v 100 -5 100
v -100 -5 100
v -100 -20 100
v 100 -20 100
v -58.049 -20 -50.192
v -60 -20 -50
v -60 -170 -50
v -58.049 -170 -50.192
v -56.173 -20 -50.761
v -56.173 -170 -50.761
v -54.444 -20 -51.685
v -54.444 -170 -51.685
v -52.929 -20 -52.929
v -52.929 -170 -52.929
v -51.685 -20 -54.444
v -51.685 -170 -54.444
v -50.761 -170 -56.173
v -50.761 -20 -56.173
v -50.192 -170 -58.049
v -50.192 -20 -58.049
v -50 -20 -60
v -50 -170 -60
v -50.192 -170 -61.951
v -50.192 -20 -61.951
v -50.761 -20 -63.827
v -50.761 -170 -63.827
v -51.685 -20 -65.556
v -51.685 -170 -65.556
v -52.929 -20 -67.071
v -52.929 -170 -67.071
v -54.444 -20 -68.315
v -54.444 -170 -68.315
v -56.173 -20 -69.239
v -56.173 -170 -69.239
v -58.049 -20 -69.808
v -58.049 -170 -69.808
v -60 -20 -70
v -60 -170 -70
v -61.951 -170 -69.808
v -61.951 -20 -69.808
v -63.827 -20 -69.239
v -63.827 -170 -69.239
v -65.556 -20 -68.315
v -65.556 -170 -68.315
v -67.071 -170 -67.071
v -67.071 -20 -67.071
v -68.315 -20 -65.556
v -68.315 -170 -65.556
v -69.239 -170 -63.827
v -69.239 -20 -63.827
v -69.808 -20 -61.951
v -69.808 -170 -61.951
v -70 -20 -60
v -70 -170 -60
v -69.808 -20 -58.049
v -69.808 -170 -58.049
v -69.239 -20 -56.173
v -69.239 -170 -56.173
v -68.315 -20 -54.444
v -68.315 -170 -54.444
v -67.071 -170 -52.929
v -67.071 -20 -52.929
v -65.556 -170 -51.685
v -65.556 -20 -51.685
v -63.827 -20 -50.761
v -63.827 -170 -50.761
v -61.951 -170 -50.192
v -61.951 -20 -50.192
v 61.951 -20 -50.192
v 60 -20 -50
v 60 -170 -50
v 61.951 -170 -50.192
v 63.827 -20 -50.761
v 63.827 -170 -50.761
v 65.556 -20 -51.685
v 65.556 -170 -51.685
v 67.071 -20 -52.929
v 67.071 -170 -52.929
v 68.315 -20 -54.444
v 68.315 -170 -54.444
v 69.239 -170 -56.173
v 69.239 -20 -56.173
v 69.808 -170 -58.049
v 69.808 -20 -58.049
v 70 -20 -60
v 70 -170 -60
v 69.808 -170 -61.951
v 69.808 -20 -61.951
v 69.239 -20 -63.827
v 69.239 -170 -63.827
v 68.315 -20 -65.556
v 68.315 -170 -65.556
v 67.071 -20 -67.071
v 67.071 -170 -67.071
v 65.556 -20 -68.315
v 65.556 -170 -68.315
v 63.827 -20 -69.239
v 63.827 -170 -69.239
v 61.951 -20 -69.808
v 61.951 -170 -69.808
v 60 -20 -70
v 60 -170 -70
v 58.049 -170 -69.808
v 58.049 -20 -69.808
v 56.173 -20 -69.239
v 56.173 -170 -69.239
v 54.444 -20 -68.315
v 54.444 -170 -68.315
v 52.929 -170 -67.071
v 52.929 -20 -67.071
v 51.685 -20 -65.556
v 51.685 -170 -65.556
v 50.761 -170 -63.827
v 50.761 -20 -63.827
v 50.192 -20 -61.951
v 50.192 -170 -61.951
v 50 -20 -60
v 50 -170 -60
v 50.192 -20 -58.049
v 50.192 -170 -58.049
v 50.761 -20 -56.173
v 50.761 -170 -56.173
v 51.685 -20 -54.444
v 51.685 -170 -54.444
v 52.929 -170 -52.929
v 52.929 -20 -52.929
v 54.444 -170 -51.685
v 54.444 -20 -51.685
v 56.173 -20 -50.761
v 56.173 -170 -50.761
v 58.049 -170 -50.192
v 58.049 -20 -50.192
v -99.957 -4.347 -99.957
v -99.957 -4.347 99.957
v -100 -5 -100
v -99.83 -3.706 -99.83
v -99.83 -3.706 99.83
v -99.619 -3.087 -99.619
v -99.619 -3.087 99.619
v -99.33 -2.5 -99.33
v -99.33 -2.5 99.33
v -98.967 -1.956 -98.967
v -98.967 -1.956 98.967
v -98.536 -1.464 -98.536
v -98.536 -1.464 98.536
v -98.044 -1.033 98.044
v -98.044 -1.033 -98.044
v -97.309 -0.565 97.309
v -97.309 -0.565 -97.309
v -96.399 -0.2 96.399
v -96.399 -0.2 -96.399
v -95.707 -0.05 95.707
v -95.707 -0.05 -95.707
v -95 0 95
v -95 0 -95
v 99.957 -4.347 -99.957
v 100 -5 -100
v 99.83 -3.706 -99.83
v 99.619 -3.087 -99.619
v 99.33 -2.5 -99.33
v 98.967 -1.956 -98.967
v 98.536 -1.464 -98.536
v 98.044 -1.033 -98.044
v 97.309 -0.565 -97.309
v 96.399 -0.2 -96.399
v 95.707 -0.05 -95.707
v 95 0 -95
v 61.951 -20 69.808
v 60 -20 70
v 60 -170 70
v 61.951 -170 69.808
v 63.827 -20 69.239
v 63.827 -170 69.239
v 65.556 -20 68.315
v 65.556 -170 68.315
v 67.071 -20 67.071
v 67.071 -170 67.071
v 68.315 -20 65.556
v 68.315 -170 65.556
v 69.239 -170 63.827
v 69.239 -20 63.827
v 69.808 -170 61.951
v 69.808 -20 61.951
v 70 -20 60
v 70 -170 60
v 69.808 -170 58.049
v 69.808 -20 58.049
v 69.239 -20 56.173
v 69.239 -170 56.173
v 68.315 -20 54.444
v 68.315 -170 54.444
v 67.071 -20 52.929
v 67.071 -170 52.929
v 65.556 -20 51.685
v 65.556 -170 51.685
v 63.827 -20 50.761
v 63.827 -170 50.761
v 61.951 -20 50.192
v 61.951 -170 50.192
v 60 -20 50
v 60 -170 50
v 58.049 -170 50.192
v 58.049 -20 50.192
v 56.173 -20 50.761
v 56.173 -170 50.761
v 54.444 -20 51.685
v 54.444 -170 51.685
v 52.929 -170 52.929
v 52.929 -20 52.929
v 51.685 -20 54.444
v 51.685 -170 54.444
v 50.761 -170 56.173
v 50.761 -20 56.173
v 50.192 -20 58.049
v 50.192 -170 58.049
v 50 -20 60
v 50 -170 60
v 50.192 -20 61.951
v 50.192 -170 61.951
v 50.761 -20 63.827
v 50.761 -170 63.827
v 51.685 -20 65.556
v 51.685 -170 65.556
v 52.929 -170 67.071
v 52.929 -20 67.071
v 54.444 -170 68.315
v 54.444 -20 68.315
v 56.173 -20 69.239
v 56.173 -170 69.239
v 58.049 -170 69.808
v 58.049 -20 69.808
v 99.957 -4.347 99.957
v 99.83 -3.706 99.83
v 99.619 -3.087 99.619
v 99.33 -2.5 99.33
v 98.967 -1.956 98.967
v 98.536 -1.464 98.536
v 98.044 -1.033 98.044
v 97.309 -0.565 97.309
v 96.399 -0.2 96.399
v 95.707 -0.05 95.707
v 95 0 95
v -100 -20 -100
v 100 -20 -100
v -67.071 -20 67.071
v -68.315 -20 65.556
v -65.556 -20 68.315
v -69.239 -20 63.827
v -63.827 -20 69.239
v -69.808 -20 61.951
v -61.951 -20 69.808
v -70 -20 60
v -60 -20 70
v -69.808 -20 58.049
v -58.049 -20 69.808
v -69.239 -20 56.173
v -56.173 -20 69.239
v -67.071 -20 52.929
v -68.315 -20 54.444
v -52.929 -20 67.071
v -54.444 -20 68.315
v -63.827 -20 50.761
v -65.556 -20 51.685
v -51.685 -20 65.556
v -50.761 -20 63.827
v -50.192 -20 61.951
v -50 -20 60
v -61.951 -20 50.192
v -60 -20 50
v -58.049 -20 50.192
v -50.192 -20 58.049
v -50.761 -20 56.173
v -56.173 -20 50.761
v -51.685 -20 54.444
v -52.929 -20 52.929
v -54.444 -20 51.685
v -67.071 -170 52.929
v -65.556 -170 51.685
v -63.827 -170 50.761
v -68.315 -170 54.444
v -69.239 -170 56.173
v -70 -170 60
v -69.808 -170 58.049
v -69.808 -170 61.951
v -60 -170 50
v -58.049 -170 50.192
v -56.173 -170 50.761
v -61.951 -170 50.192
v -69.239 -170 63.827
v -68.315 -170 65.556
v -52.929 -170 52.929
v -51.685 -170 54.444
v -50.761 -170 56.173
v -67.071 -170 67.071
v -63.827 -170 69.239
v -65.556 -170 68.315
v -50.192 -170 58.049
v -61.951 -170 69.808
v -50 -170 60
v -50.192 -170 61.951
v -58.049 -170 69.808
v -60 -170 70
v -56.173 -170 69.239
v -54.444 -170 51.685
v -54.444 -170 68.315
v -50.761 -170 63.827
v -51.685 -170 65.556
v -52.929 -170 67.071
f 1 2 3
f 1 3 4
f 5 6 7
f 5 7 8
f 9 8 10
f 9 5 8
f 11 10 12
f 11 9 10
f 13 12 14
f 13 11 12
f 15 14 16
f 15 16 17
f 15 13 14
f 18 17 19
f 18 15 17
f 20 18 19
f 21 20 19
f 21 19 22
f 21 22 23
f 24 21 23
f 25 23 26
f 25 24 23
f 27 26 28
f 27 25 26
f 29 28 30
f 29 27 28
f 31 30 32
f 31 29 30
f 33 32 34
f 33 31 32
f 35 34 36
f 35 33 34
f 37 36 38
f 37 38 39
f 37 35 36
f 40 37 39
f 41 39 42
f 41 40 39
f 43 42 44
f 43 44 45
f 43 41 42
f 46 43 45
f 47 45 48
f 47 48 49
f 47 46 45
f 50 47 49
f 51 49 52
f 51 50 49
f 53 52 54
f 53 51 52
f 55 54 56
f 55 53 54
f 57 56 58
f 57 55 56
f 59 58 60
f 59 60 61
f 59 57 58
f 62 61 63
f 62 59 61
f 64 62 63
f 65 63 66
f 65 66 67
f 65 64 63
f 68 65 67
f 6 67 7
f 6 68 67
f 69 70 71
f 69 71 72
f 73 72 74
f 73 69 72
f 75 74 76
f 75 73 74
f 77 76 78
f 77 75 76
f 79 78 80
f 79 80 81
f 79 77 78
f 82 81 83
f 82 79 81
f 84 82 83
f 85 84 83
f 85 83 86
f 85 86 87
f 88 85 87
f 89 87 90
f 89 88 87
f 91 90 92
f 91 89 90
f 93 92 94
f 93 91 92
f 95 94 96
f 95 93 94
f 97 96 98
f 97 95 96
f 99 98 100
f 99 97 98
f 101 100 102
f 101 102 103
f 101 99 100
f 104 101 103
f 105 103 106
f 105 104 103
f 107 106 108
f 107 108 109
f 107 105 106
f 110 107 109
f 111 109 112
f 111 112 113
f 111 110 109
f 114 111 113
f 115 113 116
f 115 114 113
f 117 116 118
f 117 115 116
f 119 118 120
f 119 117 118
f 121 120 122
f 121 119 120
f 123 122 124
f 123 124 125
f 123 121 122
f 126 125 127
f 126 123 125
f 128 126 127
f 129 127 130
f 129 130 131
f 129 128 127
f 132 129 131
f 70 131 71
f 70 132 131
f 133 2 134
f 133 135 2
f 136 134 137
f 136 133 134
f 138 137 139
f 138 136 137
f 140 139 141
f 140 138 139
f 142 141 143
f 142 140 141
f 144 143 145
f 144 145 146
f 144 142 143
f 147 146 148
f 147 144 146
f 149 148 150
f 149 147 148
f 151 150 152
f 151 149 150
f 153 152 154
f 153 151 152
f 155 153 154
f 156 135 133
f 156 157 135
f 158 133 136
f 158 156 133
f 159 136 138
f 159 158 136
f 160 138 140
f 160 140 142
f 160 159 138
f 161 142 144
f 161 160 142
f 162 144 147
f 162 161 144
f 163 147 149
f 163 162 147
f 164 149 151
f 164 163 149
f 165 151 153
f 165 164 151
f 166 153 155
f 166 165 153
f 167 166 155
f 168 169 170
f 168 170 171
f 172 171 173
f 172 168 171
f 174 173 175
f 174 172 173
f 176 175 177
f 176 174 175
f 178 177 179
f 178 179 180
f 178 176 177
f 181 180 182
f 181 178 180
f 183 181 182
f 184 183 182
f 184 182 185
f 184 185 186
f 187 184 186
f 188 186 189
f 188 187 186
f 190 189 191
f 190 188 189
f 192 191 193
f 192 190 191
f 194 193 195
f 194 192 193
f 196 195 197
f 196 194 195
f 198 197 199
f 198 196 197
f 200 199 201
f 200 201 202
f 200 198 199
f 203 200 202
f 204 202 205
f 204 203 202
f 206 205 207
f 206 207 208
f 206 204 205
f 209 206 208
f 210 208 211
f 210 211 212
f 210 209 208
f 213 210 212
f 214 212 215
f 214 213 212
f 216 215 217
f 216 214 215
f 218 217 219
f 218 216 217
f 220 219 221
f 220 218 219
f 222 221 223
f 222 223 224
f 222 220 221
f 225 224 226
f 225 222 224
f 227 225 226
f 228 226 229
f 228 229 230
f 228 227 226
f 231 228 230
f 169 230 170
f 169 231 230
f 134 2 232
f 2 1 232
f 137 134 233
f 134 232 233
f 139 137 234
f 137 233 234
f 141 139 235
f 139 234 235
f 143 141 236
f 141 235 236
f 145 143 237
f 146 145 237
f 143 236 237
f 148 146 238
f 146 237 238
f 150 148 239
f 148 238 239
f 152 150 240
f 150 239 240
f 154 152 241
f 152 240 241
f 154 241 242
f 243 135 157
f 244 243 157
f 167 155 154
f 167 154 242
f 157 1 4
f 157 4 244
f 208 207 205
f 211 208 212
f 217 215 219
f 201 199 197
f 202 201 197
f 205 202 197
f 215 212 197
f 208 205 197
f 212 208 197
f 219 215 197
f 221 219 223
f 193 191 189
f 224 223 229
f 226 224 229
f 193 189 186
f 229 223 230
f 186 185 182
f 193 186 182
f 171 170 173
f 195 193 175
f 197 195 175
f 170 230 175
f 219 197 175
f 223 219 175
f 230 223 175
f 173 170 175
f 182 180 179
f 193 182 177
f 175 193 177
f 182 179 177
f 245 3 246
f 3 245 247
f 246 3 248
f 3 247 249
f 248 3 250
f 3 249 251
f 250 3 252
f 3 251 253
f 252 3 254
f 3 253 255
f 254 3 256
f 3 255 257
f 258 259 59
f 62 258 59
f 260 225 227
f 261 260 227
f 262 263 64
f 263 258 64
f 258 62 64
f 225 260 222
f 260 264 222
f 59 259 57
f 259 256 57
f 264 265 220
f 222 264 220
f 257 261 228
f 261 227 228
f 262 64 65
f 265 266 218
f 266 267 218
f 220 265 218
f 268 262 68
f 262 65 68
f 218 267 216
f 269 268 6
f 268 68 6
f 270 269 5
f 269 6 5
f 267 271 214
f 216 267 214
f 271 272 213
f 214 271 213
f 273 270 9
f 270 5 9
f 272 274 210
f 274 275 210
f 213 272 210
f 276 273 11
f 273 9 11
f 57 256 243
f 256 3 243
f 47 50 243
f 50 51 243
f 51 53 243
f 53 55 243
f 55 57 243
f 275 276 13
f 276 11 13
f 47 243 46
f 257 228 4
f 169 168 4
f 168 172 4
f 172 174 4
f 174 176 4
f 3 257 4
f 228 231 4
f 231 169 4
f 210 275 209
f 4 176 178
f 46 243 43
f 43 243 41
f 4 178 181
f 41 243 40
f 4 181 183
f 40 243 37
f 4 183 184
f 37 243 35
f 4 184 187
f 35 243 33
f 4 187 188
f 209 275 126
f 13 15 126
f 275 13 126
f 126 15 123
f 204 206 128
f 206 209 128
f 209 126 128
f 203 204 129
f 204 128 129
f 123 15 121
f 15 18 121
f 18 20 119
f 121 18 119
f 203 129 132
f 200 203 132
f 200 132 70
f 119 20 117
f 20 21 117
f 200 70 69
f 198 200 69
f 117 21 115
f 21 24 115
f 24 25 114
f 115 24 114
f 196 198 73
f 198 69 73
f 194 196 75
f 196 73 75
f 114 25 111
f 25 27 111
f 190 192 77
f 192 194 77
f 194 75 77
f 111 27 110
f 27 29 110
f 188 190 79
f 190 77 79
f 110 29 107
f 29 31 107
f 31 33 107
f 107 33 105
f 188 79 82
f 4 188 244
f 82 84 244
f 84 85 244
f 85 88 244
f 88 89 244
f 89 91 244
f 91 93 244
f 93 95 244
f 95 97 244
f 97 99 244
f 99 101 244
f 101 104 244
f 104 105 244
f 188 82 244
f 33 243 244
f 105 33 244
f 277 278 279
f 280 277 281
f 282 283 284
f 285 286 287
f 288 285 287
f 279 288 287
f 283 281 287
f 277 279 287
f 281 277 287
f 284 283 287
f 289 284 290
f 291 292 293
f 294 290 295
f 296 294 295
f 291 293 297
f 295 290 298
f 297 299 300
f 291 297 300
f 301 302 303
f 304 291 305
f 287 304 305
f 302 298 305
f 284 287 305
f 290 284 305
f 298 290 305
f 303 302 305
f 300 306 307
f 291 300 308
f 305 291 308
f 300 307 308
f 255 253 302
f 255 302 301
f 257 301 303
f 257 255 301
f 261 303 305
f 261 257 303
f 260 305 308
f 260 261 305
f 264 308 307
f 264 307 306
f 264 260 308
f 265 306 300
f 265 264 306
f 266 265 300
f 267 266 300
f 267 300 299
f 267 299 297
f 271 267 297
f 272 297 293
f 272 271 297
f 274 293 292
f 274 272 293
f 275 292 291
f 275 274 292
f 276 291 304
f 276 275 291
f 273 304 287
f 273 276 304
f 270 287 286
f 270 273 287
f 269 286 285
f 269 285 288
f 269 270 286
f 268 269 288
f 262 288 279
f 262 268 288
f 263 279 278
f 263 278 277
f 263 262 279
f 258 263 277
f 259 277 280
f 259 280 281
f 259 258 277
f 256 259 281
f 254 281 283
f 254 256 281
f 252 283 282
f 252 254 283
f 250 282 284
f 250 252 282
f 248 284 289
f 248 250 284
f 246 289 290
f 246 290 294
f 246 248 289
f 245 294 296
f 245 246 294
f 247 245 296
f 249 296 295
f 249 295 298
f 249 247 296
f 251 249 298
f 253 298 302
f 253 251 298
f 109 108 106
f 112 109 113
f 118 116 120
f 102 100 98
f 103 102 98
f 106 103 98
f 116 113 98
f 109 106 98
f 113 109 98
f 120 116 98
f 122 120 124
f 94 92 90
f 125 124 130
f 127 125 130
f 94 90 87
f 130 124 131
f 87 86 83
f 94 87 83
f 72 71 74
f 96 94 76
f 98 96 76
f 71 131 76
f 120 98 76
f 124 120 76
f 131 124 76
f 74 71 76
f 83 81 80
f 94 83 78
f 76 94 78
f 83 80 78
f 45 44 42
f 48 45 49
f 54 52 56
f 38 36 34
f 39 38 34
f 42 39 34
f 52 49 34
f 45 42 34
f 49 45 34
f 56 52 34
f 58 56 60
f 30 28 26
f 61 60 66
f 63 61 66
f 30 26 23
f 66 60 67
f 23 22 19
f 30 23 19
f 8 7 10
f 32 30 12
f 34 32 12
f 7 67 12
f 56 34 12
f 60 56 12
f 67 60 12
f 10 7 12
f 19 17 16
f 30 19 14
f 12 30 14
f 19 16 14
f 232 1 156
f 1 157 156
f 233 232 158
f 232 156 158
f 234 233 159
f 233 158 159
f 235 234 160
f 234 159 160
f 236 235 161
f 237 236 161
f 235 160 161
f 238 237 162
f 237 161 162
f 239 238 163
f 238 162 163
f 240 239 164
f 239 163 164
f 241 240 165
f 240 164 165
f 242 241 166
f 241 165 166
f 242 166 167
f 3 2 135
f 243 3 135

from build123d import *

# Parameters (mm, degrees)
SKETCH_1_W      = 200
SKETCH_1_H      = 200
EXTRUDE_1_DEPTH = 20
FILLET_1_R      = 5
SKETCH_4_R      = 10
EXTRUDE_4_DEPTH = 150


with BuildPart() as part:
    # 草图1 → 凸台-拉伸1 (new body)
    with BuildSketch(Plane(origin=(0, 0, 0), x_dir=(1, 0, 0), z_dir=(0, 1, 0))):
        Rectangle(SKETCH_1_W, SKETCH_1_H)
    extrude(amount=-EXTRUDE_1_DEPTH)

    # 圆角1
    fillet_1_edges = [part.edges().sort_by_distance(p)[0] for p in [
        (0, 0, -100),
        (100, 0, 0),
        (0, 0, 100),
        (-100, 0, 0),
    ]]
    fillet(fillet_1_edges, radius=FILLET_1_R)

    # 草图4 → 凸台-拉伸4 (add)
    with BuildSketch(Plane(origin=(0, -20, 0), x_dir=(1, 0, 0), z_dir=(0, 1, 0))):
        with Locations(Location((-60, 60, 0), (0, 0, 270))):
            Circle(SKETCH_4_R)
        with Locations(Location((60, 60, 0), (0, 0, 270))):
            Circle(SKETCH_4_R)
        with Locations(Location((-60, -60, 0), (0, 0, 270))):
            Circle(SKETCH_4_R)
        with Locations(Location((60, -60, 0), (0, 0, 270))):
            Circle(SKETCH_4_R)
    extrude(amount=-EXTRUDE_4_DEPTH)


solid = part.part
